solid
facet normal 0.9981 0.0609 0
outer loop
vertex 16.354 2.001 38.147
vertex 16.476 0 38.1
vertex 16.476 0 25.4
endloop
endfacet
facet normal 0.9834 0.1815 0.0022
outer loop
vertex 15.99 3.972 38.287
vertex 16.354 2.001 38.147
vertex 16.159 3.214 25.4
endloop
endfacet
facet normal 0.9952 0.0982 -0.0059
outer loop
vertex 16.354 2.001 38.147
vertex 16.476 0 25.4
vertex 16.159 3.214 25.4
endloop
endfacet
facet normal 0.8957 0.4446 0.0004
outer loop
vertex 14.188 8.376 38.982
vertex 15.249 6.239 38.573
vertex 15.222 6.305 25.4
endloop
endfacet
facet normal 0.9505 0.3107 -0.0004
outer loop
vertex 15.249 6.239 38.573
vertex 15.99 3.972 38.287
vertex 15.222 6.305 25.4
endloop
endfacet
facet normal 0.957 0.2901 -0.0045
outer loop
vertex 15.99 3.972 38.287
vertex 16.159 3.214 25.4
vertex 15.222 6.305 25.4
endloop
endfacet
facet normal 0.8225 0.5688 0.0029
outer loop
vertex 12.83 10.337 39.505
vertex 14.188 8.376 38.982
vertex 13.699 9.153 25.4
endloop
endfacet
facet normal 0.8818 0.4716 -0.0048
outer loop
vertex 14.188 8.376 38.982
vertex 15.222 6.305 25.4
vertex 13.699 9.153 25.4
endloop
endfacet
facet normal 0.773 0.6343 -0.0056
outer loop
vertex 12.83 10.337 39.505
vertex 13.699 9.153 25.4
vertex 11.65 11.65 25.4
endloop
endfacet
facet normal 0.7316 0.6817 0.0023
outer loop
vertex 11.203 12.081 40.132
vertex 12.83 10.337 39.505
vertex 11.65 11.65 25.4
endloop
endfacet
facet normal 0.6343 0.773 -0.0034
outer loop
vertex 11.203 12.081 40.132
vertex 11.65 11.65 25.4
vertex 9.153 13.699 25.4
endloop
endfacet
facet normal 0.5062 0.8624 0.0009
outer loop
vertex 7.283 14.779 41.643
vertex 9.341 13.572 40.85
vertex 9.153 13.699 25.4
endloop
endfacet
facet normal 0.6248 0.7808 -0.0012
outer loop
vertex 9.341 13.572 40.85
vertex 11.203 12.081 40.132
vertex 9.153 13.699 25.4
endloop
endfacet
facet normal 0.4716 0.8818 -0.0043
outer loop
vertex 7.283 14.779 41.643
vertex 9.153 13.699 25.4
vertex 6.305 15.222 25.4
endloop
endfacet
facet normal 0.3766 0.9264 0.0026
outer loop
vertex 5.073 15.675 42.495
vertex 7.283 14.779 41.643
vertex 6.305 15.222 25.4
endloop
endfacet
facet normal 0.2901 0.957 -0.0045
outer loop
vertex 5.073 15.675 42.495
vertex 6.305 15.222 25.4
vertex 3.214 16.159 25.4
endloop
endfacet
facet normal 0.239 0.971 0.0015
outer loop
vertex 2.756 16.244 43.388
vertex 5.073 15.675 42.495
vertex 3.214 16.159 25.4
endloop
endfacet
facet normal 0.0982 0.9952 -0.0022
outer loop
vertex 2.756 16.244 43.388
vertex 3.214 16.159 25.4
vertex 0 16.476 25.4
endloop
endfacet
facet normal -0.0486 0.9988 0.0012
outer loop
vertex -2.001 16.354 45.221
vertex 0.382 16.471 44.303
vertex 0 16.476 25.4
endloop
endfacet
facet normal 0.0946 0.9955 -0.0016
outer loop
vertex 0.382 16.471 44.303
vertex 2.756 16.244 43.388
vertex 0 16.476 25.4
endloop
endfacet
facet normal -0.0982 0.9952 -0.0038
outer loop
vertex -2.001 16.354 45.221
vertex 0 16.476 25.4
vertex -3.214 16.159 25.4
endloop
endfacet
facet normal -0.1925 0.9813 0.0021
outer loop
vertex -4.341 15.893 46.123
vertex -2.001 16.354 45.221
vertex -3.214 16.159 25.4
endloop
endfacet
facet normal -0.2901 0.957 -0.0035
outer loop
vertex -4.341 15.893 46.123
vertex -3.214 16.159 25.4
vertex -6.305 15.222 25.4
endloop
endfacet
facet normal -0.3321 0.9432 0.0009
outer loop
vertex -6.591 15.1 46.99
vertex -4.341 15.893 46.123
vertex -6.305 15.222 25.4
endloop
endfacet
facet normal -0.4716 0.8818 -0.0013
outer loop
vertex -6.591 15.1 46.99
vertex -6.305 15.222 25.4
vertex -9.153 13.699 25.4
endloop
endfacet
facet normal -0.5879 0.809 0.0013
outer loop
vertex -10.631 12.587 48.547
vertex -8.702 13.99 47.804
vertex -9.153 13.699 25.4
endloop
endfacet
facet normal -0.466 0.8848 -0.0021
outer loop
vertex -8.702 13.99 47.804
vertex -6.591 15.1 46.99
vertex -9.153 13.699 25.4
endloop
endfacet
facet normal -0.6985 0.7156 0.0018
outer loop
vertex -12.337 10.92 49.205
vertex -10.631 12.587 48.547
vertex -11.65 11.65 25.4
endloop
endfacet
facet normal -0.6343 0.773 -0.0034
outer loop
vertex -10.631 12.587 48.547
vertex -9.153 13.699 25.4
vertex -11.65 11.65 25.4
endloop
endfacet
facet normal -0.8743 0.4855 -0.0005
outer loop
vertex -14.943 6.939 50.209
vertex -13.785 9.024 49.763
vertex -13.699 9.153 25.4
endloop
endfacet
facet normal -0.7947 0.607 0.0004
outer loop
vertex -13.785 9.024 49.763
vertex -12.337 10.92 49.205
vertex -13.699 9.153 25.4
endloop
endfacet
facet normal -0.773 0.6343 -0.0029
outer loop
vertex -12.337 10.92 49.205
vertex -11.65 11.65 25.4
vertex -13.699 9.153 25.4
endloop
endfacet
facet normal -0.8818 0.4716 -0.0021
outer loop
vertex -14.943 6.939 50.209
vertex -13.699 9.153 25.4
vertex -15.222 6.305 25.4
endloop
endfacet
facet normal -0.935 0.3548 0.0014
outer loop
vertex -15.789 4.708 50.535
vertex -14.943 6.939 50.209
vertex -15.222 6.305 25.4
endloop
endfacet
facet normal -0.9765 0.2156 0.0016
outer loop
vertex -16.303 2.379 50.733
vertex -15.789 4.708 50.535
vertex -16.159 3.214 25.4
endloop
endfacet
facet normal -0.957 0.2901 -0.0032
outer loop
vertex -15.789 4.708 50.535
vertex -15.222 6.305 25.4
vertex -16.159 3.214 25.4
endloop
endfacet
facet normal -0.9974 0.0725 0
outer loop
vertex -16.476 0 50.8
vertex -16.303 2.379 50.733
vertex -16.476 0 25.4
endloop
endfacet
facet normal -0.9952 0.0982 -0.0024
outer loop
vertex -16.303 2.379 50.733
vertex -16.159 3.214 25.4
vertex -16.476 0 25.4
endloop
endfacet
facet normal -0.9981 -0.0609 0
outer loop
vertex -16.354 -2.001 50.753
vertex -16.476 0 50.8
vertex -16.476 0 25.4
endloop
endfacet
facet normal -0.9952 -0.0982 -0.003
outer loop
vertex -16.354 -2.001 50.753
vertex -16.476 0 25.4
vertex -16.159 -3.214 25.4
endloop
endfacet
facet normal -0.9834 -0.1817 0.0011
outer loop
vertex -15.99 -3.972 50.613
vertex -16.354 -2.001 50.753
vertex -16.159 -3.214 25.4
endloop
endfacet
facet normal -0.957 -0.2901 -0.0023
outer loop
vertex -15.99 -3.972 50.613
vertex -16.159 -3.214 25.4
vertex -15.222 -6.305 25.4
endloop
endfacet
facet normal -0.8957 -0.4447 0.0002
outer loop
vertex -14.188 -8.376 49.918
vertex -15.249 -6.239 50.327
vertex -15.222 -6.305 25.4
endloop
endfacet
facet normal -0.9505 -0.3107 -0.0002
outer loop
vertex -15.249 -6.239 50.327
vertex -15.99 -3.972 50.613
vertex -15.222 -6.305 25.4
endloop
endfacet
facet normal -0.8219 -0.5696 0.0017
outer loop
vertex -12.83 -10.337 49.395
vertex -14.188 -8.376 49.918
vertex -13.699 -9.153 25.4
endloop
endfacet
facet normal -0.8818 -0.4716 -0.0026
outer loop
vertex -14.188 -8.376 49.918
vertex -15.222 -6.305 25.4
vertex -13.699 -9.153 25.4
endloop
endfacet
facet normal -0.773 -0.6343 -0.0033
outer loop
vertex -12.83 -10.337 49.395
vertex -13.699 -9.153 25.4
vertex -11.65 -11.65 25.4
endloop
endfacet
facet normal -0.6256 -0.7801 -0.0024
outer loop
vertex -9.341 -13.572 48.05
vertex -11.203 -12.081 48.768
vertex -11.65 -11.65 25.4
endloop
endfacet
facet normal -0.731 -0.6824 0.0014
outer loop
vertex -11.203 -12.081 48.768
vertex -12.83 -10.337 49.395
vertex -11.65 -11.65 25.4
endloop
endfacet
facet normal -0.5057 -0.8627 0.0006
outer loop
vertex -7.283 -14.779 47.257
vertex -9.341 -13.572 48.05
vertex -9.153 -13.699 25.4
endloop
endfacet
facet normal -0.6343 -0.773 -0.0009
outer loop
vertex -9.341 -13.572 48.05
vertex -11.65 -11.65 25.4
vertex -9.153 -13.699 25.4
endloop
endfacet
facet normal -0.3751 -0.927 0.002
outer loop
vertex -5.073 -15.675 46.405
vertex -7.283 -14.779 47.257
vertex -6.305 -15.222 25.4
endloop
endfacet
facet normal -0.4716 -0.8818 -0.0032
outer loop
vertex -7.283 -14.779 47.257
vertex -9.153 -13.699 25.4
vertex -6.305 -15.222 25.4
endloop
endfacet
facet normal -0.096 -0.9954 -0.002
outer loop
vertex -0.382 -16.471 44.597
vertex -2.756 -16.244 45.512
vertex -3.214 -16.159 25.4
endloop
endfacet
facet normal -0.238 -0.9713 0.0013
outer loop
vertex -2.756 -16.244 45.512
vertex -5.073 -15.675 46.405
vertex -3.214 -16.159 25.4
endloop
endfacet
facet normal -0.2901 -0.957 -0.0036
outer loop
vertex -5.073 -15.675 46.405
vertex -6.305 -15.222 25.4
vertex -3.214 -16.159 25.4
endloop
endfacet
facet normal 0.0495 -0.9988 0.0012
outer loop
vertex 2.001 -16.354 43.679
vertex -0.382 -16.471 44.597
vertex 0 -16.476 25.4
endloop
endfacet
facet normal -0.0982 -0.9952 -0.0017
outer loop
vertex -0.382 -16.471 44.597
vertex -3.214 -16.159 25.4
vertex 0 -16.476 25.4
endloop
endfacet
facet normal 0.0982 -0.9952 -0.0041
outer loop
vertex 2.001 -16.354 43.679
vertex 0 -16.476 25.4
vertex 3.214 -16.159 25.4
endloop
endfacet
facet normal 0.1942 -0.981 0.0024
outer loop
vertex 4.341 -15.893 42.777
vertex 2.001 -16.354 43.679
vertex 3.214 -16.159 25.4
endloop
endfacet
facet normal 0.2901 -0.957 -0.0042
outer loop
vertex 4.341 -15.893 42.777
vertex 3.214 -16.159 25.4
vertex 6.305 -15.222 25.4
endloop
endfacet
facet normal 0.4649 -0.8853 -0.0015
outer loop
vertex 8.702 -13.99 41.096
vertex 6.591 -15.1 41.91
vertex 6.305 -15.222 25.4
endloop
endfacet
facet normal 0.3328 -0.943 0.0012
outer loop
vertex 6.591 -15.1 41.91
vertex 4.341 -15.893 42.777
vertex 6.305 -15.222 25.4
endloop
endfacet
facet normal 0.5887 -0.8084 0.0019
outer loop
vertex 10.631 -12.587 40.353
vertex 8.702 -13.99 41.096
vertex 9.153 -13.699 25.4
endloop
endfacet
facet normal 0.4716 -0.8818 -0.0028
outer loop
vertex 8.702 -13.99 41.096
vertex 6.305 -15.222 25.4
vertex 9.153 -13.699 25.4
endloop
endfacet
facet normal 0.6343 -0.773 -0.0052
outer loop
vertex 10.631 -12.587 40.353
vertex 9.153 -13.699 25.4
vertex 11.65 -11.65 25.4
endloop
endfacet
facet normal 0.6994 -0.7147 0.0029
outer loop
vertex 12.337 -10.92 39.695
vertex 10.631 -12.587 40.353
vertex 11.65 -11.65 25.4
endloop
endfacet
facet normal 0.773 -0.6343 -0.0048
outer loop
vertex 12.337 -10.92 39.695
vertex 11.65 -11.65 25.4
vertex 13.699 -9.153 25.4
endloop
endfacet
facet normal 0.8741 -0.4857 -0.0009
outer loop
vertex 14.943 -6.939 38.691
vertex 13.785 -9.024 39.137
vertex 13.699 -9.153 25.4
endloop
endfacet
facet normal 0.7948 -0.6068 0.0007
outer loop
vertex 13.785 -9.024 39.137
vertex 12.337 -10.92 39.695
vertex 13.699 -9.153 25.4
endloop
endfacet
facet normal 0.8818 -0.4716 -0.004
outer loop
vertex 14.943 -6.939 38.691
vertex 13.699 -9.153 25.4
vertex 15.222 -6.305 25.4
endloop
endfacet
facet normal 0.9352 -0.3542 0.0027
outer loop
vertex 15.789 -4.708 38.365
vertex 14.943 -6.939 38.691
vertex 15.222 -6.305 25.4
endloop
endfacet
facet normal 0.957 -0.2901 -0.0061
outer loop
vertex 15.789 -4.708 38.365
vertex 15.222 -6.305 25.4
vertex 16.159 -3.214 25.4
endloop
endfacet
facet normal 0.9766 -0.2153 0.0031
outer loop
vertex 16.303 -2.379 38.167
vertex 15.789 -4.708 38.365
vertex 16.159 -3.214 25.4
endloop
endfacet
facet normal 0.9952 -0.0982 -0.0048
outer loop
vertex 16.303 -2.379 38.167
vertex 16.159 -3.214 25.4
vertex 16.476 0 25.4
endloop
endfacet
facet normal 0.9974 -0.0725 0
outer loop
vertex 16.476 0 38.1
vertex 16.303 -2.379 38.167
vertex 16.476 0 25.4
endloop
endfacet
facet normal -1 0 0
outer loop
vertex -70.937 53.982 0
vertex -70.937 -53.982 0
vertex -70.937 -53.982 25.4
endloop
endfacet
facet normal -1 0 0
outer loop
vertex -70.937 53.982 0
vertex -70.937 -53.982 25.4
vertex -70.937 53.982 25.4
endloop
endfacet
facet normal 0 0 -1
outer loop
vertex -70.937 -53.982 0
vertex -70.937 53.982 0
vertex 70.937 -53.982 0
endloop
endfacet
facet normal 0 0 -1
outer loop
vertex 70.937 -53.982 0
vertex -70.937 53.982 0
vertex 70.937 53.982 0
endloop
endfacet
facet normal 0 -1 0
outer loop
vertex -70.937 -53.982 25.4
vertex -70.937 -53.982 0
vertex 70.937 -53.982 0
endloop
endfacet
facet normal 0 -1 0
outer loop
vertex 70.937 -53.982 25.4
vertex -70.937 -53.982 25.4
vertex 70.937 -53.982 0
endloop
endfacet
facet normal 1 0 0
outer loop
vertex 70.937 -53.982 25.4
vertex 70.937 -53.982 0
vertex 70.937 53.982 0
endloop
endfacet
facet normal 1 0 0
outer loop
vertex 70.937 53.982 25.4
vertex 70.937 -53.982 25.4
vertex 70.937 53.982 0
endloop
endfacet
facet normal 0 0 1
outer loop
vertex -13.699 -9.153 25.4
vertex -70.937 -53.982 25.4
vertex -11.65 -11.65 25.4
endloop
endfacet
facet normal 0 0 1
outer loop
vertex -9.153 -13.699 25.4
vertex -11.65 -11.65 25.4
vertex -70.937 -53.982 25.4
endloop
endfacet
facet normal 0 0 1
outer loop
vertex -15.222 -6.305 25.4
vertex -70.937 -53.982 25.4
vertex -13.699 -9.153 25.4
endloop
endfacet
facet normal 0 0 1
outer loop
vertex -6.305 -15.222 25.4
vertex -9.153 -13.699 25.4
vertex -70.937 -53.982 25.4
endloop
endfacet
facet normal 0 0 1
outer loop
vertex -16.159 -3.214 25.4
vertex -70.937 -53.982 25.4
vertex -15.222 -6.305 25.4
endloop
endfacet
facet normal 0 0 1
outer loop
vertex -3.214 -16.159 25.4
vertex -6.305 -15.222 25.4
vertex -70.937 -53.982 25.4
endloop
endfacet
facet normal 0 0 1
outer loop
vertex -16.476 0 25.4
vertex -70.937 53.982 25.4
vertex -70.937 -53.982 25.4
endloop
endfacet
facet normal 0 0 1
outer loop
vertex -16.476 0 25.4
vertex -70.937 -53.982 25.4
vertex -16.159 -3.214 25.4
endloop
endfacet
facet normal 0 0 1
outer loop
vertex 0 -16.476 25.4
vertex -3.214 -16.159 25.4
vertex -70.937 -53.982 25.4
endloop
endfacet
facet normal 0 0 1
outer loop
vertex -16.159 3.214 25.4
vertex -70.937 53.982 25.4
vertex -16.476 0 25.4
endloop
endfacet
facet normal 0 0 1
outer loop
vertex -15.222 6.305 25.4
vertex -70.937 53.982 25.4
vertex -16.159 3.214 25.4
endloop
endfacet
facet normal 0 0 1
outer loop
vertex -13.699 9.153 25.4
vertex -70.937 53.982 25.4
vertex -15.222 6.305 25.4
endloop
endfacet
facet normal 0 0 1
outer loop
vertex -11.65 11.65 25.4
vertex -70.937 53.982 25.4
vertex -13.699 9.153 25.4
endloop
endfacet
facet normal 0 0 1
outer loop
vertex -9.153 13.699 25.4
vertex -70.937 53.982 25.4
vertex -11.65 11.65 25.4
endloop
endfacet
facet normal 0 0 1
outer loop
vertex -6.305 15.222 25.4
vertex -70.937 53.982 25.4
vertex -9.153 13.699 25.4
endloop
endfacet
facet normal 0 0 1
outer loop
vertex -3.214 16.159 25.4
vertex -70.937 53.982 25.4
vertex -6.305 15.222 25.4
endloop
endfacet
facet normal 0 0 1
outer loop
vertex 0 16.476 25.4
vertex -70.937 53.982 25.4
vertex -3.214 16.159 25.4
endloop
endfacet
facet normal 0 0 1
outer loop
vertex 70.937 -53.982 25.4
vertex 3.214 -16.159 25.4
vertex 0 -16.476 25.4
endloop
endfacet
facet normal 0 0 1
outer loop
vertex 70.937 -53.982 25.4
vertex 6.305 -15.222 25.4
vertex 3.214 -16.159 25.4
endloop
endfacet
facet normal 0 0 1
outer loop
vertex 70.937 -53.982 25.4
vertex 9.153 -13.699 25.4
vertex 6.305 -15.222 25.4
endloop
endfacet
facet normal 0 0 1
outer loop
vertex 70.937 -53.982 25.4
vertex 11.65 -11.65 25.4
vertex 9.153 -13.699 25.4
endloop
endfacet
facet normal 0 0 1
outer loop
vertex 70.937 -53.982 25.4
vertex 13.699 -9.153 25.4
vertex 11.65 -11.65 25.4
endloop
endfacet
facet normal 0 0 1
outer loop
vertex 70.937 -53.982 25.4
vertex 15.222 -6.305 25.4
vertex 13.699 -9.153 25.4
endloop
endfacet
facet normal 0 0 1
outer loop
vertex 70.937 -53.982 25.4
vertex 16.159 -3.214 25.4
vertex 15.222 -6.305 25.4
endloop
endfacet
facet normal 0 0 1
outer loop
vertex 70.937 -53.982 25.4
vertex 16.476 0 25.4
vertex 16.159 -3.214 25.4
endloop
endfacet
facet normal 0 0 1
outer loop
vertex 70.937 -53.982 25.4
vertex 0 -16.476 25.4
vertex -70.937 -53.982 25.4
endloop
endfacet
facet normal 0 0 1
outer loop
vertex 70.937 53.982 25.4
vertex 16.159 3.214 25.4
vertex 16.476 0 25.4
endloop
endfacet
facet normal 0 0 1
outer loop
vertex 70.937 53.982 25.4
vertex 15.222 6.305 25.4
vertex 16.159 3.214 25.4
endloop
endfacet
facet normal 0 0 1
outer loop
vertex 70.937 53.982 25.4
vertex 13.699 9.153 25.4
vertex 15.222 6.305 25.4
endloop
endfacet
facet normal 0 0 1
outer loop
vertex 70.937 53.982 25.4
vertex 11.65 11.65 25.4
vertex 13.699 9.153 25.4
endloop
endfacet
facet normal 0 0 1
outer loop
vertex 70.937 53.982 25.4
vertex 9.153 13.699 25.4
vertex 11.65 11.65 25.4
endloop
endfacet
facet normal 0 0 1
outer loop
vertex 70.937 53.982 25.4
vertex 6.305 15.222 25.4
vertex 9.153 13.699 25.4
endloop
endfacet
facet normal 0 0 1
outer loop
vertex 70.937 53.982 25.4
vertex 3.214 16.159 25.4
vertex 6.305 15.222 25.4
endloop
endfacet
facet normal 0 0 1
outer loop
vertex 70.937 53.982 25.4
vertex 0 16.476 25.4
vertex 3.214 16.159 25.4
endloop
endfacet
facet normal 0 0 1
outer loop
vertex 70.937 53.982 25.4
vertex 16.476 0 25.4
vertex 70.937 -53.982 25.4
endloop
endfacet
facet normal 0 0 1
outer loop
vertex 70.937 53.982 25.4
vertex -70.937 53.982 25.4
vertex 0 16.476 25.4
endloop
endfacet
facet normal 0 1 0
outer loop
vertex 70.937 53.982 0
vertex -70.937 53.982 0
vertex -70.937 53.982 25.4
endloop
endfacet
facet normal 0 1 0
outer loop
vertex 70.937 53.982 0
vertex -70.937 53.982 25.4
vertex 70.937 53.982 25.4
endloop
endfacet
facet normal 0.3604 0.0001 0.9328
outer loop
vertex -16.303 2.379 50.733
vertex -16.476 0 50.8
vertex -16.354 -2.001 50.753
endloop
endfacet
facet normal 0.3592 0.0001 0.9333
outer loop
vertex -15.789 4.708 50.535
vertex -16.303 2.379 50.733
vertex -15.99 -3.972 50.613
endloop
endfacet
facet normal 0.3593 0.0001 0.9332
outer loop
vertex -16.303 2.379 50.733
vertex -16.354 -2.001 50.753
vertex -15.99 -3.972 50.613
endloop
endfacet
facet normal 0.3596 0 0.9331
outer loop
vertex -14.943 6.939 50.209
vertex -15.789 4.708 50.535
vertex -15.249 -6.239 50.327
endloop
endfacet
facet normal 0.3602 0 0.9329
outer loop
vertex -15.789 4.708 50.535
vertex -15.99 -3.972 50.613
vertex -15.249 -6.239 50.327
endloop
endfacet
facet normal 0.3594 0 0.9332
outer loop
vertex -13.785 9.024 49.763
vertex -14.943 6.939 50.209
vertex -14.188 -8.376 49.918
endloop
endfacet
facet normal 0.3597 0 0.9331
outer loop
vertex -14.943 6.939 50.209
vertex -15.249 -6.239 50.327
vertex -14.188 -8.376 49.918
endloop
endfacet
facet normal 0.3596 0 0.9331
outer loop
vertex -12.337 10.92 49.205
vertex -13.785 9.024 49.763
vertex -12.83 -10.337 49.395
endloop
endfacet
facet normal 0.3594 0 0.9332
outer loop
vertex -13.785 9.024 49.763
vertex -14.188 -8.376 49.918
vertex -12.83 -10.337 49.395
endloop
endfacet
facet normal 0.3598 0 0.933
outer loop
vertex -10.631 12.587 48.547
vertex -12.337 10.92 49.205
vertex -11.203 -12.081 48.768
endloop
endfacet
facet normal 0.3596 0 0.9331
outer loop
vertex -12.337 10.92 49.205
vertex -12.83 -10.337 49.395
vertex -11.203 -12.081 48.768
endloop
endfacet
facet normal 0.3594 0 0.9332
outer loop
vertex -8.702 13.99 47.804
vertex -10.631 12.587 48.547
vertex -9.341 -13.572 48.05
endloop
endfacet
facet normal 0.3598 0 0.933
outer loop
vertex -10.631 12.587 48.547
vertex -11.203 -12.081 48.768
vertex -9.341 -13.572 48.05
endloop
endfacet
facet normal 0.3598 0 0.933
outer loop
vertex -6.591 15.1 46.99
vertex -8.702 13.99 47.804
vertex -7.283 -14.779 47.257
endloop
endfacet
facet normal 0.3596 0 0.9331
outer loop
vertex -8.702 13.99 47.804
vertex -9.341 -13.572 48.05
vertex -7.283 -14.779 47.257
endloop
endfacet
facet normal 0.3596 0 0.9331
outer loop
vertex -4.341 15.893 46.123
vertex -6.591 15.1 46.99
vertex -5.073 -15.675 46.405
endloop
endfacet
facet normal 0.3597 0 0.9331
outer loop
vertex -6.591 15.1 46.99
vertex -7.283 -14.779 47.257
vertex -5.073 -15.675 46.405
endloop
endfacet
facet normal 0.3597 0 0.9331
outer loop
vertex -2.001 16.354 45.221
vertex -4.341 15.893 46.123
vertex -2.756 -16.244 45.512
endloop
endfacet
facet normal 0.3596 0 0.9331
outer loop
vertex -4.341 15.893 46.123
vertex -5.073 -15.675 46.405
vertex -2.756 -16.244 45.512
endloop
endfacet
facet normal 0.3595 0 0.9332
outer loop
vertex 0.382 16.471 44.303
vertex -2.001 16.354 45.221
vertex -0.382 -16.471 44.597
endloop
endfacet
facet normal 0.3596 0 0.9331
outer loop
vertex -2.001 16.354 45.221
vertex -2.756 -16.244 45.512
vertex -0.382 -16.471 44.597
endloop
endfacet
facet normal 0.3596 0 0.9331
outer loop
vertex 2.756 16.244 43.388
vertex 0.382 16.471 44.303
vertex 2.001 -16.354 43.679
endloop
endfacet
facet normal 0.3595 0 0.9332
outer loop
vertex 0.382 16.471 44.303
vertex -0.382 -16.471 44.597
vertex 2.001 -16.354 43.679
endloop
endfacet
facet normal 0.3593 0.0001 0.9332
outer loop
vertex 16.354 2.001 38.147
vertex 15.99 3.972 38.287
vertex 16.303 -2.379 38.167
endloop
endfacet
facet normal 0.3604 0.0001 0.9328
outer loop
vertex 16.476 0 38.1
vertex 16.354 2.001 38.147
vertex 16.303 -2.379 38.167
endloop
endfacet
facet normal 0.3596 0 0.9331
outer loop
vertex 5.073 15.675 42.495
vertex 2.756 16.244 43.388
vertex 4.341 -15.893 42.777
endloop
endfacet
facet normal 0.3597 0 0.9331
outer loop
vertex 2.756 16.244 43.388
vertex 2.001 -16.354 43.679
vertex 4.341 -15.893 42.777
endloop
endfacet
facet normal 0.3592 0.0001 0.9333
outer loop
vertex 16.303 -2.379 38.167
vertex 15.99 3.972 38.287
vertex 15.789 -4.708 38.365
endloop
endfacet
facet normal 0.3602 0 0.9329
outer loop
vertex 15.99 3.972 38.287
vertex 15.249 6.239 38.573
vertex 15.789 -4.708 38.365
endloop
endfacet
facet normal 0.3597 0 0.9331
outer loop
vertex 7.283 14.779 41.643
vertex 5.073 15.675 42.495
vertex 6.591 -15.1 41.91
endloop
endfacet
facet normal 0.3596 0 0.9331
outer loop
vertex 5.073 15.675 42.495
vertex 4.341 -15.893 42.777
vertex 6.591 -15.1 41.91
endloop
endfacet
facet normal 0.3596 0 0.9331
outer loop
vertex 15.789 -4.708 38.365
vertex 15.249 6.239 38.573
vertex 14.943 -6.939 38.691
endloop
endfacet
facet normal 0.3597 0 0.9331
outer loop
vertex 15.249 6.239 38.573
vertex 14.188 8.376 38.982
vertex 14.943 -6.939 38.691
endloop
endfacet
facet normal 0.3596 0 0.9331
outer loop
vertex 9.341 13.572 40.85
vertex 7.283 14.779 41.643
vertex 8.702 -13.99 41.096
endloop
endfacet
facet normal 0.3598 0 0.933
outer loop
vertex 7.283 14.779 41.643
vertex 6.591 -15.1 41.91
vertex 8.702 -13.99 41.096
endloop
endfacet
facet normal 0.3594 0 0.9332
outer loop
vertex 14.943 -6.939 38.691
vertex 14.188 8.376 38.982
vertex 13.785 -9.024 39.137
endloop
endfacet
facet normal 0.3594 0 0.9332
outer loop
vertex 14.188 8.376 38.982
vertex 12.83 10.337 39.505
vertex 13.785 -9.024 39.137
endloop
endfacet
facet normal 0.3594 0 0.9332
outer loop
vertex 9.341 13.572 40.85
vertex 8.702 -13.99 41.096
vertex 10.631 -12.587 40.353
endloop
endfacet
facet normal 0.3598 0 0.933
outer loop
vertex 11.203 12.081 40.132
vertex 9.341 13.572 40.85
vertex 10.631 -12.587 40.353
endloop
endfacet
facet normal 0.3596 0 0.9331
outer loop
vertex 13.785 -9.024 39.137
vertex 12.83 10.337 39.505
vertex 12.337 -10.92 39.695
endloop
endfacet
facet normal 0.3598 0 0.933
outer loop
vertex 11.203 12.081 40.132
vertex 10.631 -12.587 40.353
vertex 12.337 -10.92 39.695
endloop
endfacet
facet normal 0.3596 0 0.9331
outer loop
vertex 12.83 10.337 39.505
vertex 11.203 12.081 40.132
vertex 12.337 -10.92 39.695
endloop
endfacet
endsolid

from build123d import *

# Parameters (mm, degrees)
F0_R     = 16.475764
F1_DEPTH = 50.8
F0_W     = 141.873404
F0_H     = 107.963092
F2_DEPTH = 25.4
F4_DEPTH = 107.964093


with BuildPart() as f1:
    # F0 (on Top) → F1 (new body)
    with BuildSketch(Plane.XY):
        Circle(F0_R)
    extrude(amount=F1_DEPTH)

    # F0 (on Top) → F2 (join)
    with BuildSketch(Plane.XY):
        Rectangle(F0_W, F0_H)
        Circle(F0_R, mode=Mode.SUBTRACT)
    extrude(amount=F2_DEPTH)

    # F3 (on face) → F4 (cut, through all)
    with BuildSketch(Plane.XZ.offset(53.981546)):
        Polygon((16.475764, 50.8), (-16.475764, 50.8), (16.475764, 38.1), align=None)
    extrude(amount=-F4_DEPTH, mode=Mode.SUBTRACT)


solid = f1.part
